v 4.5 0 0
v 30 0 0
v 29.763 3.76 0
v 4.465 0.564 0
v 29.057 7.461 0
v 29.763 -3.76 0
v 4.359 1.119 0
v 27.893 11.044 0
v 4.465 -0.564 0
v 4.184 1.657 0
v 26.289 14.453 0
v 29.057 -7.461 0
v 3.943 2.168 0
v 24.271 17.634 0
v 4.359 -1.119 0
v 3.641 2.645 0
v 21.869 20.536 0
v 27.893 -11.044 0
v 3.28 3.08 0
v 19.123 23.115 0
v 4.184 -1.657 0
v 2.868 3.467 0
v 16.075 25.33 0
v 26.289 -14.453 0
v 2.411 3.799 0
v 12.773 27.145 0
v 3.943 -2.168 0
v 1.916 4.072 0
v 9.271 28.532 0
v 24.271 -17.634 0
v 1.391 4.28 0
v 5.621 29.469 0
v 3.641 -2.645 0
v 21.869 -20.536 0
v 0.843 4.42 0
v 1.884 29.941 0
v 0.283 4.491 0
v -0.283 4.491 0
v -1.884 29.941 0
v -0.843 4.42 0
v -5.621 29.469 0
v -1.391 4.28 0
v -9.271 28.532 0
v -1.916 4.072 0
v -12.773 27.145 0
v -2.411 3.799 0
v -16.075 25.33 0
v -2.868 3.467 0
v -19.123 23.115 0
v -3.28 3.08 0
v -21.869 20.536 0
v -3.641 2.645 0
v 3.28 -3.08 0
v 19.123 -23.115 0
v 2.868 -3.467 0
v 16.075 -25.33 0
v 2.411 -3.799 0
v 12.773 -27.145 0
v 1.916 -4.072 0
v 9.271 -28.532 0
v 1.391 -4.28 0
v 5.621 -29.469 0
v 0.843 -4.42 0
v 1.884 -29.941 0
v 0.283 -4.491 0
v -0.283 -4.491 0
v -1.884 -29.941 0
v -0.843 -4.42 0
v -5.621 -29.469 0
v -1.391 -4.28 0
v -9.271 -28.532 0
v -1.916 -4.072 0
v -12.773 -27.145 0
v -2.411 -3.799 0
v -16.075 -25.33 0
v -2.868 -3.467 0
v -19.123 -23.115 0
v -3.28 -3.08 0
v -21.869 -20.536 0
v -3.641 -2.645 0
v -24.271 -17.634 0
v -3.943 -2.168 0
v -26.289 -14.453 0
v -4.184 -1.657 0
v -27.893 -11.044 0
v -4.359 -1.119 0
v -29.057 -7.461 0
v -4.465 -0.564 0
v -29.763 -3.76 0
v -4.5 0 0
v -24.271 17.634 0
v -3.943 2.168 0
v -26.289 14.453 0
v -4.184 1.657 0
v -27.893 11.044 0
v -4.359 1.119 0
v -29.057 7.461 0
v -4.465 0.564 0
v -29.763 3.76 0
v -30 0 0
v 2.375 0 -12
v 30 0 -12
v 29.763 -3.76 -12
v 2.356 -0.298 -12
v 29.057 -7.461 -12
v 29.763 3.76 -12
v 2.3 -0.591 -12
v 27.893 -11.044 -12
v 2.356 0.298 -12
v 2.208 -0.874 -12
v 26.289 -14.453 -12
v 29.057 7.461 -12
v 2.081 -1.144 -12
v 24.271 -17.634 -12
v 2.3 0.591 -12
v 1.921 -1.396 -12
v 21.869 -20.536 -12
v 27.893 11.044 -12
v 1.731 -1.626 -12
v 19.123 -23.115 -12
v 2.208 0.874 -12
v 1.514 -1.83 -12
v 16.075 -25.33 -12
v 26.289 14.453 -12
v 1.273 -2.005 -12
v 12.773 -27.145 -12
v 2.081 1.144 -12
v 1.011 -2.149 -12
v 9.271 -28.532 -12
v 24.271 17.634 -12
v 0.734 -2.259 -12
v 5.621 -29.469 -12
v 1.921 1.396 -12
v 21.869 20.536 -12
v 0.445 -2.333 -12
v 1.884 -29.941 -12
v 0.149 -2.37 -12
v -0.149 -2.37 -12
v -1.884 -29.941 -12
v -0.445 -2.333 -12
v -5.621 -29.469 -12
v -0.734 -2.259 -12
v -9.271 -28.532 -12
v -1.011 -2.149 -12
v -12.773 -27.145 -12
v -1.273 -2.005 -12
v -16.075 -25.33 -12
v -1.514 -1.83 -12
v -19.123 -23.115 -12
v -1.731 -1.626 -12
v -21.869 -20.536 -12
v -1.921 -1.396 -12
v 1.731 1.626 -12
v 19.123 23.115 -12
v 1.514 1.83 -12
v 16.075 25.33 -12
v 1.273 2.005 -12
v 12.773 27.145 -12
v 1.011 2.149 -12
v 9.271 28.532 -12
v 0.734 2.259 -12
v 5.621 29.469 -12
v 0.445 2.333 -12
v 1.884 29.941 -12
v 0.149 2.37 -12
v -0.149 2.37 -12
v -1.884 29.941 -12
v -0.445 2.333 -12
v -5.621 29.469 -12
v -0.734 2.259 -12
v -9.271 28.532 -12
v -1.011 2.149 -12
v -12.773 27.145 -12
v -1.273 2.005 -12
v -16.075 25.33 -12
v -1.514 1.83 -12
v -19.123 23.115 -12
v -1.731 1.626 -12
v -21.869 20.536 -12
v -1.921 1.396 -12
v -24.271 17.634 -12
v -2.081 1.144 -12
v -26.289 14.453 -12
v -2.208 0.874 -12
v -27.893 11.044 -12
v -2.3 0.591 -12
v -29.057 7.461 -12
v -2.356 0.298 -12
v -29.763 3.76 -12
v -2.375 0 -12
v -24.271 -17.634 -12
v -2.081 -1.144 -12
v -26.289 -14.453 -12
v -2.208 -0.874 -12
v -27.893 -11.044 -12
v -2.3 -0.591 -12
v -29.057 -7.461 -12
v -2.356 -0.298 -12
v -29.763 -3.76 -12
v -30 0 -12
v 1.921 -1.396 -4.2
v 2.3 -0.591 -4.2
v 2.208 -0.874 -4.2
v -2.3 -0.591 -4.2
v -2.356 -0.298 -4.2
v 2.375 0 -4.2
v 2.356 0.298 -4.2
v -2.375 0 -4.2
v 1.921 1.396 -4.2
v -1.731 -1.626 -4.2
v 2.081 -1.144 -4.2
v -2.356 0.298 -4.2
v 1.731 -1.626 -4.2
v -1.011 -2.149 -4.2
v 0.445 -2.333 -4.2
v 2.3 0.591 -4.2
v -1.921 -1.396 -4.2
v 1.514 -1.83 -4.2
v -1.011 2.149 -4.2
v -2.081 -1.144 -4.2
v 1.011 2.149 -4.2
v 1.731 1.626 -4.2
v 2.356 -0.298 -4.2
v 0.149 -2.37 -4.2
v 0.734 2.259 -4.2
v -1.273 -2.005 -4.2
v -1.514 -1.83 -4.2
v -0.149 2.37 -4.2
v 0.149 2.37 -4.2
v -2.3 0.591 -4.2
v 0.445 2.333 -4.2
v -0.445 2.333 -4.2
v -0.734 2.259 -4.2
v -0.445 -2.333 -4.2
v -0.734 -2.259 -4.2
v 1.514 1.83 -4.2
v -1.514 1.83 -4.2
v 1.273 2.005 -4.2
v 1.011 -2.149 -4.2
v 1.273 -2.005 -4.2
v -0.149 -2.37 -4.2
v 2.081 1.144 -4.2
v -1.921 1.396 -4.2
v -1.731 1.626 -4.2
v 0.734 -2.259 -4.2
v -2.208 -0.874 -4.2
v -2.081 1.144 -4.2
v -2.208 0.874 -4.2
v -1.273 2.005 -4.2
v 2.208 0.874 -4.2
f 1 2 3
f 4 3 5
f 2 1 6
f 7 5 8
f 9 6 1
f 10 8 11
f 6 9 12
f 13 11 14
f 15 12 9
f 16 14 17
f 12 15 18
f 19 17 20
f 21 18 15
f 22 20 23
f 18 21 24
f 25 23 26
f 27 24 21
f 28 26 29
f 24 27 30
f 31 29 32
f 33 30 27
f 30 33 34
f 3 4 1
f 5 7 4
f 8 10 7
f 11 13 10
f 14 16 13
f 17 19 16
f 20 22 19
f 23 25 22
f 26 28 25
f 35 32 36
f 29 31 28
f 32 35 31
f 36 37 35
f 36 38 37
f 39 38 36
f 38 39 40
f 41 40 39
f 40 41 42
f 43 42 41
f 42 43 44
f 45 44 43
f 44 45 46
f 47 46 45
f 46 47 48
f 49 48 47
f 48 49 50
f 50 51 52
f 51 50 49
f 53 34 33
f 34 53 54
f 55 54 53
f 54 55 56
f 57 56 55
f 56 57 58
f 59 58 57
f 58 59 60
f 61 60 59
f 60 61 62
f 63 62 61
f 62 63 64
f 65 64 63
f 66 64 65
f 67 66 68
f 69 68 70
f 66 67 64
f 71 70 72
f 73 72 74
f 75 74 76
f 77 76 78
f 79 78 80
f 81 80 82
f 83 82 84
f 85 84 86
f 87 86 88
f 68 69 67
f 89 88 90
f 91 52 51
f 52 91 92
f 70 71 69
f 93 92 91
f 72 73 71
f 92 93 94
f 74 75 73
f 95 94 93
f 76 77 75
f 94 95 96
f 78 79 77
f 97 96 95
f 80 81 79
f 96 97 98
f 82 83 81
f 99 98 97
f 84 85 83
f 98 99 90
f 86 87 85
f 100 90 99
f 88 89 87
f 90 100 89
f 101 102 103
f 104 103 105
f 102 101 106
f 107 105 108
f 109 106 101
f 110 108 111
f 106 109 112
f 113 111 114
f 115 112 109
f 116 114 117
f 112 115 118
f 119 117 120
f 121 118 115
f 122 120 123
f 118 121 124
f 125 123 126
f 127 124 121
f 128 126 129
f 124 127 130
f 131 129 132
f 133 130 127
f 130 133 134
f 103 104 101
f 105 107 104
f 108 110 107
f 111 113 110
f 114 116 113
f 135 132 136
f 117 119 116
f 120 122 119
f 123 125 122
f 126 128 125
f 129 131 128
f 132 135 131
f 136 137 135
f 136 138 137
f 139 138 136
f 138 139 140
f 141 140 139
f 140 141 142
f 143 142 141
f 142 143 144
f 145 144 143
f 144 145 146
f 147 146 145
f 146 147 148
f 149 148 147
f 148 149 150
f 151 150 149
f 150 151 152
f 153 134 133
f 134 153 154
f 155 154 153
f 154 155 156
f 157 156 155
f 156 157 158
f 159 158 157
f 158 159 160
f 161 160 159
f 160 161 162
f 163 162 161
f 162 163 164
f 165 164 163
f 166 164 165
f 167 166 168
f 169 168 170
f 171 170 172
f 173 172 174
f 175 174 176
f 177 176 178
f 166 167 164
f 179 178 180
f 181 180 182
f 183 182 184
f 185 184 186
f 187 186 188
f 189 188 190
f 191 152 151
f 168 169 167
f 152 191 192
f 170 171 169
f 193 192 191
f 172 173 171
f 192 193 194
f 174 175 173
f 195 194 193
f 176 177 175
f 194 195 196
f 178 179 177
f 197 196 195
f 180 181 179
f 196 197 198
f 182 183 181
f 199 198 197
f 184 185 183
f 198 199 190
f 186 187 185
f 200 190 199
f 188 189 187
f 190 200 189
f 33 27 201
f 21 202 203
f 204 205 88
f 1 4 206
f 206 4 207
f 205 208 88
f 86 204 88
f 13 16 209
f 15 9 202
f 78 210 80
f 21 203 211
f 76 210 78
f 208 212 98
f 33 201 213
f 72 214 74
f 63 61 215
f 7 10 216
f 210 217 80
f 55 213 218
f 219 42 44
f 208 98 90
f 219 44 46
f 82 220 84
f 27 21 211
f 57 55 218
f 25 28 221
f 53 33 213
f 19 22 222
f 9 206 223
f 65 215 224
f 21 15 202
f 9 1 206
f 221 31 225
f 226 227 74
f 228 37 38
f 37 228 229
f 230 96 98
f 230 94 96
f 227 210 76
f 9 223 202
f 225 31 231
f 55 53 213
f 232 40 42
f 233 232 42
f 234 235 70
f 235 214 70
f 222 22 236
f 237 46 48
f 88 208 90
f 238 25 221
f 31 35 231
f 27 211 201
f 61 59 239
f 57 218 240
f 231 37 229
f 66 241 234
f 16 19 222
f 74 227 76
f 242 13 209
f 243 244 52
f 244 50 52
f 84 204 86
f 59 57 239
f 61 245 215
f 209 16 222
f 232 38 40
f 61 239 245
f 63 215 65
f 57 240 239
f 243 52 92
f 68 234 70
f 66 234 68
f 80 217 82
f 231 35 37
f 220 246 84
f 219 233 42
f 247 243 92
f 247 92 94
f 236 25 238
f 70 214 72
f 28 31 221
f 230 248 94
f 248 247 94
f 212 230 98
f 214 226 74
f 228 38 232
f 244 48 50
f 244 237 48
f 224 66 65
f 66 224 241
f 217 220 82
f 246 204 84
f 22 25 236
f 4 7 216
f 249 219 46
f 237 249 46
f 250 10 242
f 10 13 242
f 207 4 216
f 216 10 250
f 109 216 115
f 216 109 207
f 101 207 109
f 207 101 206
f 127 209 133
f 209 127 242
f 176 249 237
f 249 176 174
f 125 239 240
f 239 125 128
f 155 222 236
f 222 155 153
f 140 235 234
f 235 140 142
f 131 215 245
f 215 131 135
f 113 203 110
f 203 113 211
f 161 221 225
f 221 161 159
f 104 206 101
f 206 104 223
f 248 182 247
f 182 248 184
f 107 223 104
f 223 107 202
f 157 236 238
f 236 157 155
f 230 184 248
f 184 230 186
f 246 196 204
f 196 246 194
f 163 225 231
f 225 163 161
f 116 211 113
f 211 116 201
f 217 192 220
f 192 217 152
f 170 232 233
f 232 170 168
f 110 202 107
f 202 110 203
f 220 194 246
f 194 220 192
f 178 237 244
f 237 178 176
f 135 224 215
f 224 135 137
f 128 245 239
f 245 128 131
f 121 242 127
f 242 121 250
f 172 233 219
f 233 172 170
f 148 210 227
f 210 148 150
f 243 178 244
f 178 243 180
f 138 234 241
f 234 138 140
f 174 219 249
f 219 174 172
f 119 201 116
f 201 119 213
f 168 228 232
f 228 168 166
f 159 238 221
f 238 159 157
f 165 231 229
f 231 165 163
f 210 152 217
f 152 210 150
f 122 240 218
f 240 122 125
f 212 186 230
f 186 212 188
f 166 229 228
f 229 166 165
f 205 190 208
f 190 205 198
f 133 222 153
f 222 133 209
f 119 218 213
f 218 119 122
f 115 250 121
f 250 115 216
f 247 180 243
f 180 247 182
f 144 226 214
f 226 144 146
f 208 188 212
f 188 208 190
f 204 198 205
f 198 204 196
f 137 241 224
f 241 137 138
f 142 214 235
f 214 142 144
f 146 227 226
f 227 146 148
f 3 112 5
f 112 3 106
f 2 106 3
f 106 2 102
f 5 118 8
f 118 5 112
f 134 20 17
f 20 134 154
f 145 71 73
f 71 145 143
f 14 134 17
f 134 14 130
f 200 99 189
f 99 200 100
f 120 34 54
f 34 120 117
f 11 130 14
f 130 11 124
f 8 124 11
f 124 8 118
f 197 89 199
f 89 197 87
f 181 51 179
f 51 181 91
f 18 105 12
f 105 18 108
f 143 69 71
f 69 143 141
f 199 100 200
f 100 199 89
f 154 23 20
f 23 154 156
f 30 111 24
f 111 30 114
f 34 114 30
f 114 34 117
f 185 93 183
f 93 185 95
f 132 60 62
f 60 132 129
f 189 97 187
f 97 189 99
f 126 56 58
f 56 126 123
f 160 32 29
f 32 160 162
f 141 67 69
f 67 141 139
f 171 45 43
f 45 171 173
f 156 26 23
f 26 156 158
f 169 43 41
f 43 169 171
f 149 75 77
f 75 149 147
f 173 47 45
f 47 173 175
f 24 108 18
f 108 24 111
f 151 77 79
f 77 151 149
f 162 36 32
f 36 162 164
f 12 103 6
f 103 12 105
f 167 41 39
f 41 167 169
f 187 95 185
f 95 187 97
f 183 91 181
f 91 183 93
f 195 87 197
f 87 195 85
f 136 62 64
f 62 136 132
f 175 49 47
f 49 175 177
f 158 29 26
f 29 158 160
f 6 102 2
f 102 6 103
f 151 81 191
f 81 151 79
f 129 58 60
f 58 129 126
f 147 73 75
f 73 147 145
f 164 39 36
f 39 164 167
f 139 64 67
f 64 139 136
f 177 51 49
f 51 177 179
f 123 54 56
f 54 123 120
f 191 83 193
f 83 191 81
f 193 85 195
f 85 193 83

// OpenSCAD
$fn = 50;


difference() {
	union() {
		translate(v = [0, 0, -12.0000000000]) {
			cylinder(h = 12, r = 30.0000000000);
		}
	}
	union() {
		translate(v = [0, 0, 0]) {
			rotate(a = [0, 0, 0]) {
				difference() {
					union() {
						translate(v = [0, 0, -12.0000000000]) {
							cylinder(h = 12, r = 2.2500000000);
						}
						translate(v = [0, 0, -4.2000000000]) {
							cylinder(h = 4.2000000000, r1 = 2.3750000000, r2 = 4.5000000000);
						}
						translate(v = [0, 0, -12.0000000000]) {
							cylinder(h = 12, r = 2.3750000000);
						}
						translate(v = [0, 0, -12.0000000000]) {
							cylinder(h = 12, r = 2.2500000000);
						}
					}
					union();
				}
			}
		}
	}
}
